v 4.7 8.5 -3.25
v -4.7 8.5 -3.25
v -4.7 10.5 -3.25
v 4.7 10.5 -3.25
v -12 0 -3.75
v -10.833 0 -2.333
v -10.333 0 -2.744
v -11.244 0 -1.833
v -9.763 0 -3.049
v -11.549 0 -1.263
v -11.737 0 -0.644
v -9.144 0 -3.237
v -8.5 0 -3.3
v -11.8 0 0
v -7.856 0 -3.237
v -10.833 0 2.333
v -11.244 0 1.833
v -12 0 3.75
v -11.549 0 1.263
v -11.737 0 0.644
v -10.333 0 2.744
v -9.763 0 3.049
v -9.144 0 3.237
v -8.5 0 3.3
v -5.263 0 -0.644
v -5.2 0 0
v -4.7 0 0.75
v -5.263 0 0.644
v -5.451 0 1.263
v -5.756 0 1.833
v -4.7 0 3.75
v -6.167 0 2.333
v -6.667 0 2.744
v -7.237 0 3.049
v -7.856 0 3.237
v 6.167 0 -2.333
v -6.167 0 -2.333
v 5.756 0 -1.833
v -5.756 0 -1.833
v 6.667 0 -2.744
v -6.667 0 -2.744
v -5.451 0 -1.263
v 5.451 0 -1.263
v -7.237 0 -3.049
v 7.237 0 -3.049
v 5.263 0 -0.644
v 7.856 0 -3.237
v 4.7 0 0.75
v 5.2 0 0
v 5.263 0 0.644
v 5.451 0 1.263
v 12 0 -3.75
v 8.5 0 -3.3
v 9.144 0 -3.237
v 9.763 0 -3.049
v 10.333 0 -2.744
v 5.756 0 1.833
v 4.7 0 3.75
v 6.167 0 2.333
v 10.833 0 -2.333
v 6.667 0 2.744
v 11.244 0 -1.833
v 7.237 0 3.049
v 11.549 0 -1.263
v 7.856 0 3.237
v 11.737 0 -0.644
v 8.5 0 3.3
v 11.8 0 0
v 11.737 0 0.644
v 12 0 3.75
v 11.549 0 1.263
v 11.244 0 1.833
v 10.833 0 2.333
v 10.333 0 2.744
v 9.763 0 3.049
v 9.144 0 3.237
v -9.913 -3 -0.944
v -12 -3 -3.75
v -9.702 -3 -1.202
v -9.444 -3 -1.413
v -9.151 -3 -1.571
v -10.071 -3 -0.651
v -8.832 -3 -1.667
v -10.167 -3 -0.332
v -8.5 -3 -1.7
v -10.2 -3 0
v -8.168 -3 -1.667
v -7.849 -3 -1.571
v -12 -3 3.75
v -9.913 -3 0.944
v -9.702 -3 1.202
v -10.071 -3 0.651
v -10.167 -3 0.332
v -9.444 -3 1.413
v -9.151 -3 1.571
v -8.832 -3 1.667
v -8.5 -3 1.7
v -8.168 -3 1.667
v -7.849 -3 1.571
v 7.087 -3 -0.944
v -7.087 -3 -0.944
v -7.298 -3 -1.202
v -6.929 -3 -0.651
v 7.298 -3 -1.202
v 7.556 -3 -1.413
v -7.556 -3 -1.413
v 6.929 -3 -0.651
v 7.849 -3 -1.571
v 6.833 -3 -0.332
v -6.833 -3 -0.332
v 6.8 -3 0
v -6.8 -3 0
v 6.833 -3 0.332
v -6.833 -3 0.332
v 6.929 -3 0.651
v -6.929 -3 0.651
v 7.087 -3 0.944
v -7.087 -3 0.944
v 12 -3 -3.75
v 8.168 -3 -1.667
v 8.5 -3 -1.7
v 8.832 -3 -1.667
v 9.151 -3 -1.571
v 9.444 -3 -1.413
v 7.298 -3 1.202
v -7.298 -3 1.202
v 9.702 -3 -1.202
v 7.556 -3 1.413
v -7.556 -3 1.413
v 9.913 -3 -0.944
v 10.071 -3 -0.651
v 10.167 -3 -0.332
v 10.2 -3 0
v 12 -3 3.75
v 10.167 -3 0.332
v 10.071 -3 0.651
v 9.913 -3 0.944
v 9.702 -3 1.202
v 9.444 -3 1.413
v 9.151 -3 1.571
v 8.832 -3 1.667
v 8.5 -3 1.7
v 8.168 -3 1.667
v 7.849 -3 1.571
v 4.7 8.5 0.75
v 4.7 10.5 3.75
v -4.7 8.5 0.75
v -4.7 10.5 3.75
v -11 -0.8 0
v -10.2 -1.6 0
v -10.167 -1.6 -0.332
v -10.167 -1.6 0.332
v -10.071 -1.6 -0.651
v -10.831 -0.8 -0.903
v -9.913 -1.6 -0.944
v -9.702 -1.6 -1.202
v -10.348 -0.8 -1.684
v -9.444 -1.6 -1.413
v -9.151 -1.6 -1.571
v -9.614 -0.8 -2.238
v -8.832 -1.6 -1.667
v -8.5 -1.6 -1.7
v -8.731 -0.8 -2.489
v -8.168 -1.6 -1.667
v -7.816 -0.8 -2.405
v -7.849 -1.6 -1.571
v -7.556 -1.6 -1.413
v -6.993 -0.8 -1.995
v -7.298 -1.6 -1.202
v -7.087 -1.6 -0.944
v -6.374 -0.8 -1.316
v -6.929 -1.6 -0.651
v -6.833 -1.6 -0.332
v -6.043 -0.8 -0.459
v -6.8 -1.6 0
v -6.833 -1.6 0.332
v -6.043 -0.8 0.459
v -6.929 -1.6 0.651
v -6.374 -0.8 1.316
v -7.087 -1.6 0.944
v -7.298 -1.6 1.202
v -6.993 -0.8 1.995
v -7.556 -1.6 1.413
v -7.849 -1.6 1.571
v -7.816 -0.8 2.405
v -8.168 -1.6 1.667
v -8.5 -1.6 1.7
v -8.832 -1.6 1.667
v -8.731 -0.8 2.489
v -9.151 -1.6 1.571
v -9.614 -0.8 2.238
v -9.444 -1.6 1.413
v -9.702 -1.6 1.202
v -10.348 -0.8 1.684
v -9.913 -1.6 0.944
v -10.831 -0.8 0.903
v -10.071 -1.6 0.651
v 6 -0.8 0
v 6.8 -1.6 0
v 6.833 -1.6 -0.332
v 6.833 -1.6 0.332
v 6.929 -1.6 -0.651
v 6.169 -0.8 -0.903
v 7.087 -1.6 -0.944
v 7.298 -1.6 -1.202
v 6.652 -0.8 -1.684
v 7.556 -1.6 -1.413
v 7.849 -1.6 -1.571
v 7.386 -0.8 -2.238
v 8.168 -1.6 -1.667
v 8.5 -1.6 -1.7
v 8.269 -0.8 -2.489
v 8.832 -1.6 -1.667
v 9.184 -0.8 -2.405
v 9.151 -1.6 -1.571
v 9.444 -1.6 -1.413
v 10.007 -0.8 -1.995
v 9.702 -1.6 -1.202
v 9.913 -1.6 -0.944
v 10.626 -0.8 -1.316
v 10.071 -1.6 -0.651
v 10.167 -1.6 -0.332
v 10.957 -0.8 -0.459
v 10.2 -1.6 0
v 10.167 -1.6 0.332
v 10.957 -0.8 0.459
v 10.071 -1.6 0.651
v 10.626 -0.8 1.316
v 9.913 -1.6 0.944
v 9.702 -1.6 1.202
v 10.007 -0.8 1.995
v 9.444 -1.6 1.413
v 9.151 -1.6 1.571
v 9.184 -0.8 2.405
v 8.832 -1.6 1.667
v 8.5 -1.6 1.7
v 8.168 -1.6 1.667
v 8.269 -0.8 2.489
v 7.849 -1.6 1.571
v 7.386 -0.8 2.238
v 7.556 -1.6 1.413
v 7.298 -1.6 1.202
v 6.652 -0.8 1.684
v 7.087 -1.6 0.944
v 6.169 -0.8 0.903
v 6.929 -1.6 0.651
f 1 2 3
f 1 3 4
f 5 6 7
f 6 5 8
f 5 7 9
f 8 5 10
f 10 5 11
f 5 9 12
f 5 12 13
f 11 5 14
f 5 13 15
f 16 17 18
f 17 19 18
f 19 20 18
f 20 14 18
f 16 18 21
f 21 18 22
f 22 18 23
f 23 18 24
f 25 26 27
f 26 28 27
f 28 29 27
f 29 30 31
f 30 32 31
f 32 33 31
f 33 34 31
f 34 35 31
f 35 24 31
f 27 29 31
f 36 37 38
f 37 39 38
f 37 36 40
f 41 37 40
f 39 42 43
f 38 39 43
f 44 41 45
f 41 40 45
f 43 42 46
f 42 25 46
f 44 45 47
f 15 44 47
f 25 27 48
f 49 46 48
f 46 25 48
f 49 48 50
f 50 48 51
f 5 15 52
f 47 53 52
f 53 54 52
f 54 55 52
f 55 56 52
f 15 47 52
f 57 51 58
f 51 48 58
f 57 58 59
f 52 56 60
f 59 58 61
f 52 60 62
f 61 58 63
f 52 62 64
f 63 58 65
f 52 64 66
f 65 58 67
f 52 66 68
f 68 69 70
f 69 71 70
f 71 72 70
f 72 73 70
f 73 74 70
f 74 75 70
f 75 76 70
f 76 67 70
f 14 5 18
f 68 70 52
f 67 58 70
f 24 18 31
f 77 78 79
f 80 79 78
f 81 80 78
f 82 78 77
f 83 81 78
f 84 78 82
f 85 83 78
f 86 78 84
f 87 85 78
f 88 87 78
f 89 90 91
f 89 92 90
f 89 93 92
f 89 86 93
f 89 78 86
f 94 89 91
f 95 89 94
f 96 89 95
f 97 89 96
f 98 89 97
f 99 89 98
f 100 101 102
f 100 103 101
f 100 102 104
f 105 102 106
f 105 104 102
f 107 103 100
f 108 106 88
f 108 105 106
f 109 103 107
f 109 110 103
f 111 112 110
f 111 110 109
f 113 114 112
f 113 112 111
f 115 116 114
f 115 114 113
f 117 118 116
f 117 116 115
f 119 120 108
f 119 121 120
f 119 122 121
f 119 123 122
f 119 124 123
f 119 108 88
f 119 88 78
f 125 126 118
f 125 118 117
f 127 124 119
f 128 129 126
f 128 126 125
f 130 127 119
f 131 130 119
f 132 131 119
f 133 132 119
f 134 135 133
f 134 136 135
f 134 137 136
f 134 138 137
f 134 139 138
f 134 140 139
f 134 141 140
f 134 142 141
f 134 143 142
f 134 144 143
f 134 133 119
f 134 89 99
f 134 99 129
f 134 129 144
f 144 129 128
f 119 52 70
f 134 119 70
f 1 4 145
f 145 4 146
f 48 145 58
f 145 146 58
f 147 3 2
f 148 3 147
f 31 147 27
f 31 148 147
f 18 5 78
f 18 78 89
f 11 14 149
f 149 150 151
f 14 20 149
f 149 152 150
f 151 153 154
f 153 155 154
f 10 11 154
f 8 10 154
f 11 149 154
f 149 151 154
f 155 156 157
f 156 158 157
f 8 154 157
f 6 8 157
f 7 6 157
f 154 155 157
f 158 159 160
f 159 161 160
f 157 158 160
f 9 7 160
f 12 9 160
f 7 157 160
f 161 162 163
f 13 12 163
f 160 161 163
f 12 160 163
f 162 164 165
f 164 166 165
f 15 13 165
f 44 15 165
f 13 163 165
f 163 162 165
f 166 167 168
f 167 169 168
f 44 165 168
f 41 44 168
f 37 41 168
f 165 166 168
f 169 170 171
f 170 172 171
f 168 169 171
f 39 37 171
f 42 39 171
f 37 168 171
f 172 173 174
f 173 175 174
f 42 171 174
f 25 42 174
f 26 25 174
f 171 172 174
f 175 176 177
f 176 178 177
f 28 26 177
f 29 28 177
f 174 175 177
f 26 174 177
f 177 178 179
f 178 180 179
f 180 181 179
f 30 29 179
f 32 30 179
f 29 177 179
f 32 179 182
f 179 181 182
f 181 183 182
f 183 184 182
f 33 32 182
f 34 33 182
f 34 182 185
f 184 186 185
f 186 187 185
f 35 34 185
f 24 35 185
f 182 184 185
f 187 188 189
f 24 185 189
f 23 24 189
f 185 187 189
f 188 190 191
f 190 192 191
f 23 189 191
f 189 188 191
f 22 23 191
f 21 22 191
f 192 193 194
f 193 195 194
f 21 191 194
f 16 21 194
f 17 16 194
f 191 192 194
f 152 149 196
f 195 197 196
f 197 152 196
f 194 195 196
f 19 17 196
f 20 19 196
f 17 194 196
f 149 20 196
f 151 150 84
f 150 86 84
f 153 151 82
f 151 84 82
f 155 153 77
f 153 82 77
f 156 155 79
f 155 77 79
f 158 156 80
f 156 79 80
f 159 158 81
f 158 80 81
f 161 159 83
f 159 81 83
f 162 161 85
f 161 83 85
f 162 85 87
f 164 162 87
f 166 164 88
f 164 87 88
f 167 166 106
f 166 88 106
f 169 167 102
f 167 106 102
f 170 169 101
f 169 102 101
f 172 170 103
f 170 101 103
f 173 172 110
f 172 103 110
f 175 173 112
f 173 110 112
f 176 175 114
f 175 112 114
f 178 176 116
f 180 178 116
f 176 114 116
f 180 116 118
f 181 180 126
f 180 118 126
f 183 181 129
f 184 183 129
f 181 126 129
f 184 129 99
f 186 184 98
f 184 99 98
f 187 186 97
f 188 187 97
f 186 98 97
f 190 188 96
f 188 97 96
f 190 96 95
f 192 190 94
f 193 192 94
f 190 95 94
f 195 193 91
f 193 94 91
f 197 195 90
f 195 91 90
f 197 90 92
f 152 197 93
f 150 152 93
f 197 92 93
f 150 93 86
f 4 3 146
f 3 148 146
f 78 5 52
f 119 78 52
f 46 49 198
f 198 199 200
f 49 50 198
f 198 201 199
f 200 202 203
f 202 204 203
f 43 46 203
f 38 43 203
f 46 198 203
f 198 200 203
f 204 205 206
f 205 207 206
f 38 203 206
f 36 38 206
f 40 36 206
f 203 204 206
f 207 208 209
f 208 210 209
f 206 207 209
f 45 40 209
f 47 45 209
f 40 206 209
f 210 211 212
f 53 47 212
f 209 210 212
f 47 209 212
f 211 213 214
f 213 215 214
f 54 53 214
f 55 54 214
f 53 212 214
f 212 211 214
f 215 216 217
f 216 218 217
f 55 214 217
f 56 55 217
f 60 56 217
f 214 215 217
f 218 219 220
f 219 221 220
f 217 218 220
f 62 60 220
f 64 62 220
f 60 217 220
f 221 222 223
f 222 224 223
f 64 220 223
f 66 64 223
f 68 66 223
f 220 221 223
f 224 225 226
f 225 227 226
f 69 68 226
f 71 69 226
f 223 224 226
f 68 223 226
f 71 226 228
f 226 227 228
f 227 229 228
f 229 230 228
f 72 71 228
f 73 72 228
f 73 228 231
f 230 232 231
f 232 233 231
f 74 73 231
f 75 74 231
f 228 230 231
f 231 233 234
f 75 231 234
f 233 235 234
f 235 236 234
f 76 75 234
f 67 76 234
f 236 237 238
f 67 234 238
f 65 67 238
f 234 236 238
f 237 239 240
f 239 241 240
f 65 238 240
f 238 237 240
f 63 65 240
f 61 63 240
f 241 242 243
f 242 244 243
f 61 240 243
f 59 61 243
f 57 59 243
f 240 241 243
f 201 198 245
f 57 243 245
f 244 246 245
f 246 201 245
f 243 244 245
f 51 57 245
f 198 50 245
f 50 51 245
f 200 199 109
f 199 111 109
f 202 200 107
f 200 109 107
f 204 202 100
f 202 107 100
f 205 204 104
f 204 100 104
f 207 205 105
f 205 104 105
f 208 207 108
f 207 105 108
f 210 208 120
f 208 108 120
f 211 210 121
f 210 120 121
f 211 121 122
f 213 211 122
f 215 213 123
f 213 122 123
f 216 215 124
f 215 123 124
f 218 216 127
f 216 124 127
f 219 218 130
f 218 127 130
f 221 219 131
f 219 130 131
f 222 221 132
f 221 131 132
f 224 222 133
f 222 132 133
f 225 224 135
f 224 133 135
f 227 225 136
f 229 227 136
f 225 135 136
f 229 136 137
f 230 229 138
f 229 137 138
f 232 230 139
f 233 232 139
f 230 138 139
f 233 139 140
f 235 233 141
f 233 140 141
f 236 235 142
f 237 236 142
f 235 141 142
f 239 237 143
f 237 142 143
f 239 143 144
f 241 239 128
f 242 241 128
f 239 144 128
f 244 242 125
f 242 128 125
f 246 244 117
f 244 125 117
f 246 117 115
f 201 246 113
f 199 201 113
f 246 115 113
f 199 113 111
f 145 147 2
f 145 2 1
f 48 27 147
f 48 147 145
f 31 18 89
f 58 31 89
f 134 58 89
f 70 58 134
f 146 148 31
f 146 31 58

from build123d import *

# Parameters (mm, degrees)
F0_W           = 24
F0_H           = 7.5
F1_DEPTH       = 3
F2_D           = 3.4
F2_CSINK_D     = 6.6
F2_CSINK_ANGLE = 90
F3_W           = 9.4
F3_H           = 3
F4_DEPTH       = 10.5
F5_W           = 9.4
F5_H           = 2
F6_DEPTH       = 4


with BuildPart() as f1:
    # F0 (on Front) → F1 (new body)
    with BuildSketch(Plane.XZ):
        Rectangle(F0_W, F0_H)
    extrude(amount=F1_DEPTH)

    # F2 (through all)
    with Locations(Plane(origin=(0, 0, 0), x_dir=(1, 0, 0), z_dir=(0, 1, 0))):
        with Locations((-8.5, 0), (8.5, 0)):
            CounterSinkHole(F2_D / 2, F2_CSINK_D / 2, counter_sink_angle=F2_CSINK_ANGLE)

    # F3 (on face) → F4 (join)
    with BuildSketch(Plane.XZ):
        with Locations((0, 2.25)):
            Rectangle(F3_W, F3_H)
    extrude(amount=-F4_DEPTH)

    # F5 (on face) → F6 (join)
    with BuildSketch(Plane(origin=(0, 0, 0.75), x_dir=(1, 0, 0), z_dir=(0, 0, -1))):
        with Locations((0, -9.5)):
            Rectangle(F5_W, F5_H)
    extrude(amount=F6_DEPTH)


solid = f1.part
